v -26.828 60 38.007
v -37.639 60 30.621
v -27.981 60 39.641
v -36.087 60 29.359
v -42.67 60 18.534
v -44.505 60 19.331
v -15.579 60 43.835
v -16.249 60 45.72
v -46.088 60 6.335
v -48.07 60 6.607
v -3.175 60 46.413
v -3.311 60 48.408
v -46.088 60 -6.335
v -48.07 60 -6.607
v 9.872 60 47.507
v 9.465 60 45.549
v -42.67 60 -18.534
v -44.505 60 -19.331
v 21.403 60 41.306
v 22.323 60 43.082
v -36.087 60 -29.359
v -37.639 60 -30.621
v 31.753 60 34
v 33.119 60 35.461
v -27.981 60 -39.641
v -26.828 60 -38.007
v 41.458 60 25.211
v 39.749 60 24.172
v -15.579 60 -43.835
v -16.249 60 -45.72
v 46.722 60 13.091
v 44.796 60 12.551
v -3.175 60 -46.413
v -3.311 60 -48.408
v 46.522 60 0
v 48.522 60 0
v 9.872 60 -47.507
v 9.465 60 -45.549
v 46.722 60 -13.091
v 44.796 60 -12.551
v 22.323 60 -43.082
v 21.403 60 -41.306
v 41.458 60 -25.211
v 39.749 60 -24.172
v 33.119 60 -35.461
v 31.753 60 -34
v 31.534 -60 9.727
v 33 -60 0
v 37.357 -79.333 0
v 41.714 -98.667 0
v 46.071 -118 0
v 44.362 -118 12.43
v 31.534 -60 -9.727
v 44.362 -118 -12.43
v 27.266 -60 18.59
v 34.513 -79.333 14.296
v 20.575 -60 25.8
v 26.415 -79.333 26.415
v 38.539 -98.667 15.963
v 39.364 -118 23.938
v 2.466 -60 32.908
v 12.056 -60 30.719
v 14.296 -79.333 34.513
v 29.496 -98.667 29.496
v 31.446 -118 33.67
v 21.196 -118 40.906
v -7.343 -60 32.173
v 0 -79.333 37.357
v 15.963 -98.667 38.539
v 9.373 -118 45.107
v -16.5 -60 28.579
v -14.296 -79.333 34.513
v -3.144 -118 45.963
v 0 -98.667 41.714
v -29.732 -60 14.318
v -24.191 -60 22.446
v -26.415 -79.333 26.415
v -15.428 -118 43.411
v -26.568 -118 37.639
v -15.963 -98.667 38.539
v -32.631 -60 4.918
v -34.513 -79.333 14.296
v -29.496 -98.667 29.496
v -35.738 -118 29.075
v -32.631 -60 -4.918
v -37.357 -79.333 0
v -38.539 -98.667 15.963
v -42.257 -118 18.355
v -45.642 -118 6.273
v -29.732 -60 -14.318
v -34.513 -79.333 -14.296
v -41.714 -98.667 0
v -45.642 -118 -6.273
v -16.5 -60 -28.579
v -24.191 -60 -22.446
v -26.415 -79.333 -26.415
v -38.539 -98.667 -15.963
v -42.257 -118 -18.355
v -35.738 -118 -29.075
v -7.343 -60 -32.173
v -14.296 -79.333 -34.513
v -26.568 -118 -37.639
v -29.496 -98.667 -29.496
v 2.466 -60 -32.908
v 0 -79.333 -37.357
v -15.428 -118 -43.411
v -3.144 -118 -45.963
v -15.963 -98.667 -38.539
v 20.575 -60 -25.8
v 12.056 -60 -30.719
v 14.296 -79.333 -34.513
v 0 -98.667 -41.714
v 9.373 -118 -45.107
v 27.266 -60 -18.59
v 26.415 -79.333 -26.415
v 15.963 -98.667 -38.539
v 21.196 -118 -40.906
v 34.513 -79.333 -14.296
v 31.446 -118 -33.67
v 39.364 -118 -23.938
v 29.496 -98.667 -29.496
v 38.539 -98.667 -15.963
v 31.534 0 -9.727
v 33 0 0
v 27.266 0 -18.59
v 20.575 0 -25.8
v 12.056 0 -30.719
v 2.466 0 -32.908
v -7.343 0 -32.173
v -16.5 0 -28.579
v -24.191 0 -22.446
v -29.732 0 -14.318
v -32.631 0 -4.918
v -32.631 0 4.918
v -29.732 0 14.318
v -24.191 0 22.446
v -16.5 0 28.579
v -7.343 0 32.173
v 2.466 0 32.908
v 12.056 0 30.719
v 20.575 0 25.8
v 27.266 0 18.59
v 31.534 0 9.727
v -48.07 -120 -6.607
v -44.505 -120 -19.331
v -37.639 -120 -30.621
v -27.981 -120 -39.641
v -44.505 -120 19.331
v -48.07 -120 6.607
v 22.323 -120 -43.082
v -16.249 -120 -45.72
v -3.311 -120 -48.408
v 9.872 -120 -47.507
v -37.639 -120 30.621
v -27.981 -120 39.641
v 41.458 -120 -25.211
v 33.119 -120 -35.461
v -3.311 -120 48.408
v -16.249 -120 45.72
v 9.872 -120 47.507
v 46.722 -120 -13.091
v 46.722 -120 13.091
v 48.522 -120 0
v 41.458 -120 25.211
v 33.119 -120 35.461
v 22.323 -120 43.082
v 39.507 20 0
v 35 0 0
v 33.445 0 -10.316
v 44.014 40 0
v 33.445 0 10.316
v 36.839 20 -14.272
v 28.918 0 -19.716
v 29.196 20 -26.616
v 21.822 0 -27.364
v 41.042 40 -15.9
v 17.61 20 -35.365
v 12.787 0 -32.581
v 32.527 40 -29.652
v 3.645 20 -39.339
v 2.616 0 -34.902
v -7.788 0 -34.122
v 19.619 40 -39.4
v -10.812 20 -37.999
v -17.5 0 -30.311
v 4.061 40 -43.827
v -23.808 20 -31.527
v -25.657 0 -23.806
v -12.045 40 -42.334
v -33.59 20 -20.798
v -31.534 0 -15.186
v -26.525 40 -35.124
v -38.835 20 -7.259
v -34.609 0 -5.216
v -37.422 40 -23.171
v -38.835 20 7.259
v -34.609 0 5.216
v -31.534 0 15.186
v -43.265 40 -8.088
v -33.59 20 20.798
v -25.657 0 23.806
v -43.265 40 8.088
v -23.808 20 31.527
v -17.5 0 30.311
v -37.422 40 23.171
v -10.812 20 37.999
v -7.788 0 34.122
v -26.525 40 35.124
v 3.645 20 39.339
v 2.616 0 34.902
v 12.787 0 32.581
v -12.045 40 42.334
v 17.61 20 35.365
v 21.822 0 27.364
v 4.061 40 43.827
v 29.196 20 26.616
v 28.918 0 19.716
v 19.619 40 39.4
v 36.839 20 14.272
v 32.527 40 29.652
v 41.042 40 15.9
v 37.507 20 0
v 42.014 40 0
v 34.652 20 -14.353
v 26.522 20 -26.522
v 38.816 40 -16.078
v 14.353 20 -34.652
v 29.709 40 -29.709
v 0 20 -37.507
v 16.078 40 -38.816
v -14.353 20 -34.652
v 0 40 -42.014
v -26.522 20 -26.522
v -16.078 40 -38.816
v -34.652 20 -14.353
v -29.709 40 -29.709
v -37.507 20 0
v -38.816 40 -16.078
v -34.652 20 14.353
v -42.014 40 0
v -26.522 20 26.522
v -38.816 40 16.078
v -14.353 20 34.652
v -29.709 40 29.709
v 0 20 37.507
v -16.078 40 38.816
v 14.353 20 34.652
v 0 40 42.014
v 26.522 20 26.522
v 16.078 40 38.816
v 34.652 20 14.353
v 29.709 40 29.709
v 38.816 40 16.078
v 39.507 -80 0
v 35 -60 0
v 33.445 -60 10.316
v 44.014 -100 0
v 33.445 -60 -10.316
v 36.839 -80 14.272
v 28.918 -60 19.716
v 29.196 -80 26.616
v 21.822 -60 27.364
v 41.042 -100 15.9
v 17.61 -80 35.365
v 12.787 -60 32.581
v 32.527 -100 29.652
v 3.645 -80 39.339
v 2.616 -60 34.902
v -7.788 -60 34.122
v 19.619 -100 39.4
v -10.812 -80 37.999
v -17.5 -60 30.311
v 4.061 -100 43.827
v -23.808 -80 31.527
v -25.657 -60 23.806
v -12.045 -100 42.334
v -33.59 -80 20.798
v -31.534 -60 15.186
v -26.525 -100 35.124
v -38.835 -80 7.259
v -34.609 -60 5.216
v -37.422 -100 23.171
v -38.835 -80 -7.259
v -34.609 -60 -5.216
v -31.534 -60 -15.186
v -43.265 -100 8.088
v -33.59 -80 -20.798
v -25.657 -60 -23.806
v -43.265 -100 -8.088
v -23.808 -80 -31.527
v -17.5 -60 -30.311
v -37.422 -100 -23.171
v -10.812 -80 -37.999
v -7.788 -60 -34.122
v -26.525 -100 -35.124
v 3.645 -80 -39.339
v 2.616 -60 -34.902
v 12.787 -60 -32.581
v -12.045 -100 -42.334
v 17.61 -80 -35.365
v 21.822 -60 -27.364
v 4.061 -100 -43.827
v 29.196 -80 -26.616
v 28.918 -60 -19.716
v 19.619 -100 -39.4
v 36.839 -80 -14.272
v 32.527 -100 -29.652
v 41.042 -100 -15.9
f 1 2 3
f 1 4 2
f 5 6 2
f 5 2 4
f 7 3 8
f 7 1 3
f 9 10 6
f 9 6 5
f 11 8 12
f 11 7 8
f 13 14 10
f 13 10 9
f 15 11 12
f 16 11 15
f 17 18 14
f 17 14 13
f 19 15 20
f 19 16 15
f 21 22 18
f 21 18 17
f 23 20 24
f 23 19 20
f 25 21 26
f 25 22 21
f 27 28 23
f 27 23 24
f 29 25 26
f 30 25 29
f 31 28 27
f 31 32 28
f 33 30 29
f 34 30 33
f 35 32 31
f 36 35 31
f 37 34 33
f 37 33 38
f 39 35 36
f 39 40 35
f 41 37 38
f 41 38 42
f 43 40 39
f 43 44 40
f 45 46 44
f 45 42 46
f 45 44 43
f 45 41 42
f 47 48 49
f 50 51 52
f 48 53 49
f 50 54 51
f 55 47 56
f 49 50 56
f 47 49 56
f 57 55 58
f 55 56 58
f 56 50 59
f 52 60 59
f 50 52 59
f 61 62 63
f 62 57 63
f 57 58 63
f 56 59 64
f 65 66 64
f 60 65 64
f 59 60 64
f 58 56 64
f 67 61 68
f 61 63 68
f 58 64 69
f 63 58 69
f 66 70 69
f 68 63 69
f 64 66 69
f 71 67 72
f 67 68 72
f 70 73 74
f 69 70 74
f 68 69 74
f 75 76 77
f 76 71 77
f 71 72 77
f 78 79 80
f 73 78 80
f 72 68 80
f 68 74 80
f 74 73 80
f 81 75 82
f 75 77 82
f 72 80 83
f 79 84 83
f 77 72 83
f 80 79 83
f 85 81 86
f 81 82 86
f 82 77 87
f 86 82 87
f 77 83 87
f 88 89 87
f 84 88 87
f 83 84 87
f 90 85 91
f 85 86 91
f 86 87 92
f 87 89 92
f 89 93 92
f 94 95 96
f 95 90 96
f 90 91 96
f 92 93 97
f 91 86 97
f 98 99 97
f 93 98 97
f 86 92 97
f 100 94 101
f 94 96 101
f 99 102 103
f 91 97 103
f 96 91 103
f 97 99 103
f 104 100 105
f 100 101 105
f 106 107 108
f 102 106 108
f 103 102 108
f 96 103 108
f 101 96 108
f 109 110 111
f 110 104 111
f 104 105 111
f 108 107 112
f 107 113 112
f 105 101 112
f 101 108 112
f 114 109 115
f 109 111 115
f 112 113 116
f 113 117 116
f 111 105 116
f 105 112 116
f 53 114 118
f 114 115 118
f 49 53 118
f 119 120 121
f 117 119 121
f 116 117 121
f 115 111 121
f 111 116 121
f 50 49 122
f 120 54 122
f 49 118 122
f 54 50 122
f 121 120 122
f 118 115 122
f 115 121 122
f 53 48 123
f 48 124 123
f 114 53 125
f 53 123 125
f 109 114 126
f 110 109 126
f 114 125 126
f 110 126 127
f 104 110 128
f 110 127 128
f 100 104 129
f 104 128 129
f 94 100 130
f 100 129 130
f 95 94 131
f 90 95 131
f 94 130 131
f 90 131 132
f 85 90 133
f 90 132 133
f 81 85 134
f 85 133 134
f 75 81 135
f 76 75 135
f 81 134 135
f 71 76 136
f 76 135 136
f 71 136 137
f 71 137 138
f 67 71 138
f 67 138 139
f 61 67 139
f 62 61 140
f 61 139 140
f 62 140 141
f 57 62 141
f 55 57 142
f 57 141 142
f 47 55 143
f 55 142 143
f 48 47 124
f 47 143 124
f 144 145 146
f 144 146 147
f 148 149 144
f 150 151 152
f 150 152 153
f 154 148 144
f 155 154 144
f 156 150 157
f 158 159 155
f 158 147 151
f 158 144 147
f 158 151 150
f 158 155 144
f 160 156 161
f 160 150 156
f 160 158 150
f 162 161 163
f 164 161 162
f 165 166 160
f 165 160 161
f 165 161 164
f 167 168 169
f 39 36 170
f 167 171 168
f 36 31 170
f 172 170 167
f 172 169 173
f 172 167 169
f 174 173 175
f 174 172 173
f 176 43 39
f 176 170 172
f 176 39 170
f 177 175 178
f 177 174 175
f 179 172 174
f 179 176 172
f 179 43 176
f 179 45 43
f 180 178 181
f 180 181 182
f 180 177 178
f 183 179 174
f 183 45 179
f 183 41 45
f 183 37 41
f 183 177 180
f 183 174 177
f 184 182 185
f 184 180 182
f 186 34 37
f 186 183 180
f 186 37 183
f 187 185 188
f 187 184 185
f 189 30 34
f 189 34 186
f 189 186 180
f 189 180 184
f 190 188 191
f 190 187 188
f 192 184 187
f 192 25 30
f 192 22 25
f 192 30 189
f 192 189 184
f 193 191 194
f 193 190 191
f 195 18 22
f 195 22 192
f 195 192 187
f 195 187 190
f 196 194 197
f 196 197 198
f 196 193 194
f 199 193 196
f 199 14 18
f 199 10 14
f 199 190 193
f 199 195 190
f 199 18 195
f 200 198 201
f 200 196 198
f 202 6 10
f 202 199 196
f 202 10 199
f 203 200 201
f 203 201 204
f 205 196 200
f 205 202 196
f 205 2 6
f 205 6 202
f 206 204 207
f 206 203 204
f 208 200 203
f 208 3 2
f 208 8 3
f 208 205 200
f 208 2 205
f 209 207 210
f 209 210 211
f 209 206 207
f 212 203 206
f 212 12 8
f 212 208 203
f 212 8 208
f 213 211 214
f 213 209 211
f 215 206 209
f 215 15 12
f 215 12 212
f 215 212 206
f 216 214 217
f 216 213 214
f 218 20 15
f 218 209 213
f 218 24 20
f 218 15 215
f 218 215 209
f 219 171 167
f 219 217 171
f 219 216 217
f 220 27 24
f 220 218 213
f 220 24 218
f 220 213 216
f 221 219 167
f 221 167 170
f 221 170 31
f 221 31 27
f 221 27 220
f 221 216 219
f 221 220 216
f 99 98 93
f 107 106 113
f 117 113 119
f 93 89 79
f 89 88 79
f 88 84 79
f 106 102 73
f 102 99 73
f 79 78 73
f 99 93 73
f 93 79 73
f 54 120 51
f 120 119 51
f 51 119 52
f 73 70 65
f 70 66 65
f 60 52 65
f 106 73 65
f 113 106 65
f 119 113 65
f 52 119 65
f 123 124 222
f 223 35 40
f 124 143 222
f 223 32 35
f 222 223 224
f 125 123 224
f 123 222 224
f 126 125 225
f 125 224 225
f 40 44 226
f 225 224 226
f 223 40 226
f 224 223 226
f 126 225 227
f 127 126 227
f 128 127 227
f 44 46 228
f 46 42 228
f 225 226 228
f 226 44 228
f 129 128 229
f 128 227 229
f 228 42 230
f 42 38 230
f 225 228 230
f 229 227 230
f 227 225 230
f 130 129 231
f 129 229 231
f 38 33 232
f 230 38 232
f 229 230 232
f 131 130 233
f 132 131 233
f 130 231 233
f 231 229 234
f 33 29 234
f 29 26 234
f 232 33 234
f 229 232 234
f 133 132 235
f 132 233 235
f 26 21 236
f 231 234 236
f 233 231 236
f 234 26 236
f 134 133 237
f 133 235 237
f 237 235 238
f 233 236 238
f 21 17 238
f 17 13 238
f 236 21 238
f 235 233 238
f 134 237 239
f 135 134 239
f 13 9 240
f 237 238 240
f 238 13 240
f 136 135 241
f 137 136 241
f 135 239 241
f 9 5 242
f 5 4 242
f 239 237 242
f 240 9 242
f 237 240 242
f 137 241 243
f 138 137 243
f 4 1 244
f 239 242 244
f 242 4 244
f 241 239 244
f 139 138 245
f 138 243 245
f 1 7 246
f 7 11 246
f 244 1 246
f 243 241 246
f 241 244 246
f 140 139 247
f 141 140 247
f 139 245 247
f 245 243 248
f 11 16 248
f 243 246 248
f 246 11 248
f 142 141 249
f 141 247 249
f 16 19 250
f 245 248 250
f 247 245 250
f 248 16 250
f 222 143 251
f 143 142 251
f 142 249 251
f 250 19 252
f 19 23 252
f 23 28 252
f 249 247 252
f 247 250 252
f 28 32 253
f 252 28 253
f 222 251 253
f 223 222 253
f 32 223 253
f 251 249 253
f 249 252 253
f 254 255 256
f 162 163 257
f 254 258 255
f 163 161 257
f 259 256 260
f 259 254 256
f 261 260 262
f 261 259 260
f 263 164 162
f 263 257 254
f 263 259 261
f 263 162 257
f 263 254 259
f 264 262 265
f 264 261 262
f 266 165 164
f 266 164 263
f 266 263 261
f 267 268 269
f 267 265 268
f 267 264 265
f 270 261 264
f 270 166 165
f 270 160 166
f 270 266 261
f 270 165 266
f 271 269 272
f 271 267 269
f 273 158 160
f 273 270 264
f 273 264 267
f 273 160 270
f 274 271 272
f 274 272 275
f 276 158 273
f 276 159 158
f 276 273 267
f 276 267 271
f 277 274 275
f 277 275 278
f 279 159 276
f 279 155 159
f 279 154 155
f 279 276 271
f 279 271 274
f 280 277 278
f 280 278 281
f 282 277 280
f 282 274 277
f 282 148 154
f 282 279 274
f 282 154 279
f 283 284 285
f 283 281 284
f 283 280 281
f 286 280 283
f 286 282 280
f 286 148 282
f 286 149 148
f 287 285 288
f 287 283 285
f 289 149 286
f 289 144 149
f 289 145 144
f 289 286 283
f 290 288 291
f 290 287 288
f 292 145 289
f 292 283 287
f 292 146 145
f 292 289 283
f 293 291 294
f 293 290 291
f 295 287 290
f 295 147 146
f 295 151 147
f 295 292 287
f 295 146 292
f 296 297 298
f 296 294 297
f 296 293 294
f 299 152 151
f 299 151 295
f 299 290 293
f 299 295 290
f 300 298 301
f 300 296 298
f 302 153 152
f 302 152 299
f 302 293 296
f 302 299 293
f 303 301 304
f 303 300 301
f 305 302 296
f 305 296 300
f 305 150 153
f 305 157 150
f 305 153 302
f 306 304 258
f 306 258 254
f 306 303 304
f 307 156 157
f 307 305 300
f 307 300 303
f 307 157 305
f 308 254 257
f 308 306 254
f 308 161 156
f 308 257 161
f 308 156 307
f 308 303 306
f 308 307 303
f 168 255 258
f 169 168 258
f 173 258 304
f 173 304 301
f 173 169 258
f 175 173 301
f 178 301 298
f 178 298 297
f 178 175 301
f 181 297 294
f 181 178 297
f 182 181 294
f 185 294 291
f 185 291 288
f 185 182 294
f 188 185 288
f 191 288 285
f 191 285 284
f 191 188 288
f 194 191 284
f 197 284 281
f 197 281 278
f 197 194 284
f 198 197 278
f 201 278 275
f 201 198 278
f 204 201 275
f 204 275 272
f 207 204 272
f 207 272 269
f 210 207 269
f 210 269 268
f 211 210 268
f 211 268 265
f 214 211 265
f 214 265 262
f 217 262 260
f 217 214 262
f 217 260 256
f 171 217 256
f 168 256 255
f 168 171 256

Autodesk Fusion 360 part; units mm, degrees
sketch "草图1" plane through (0, 0, 0) normal (0, 1, 0) x (1, 0, 0)
  circle A0 centre (0, 0) radius 46.5
  circle A1 centre (0, 0) radius 33
  circle A2 centre (0, 0) radius 48.5
  circle A3 centre (0, 0) radius 35
  dimension "d1" = 93
  dimension "d2" = 66
  dimension "d3" = 97
  dimension "d4" = 70
extrude "拉伸3" add sketch "草图1" along normal blind 60 draft 12.7 contours A3
extrude "拉伸4" cut sketch "草图1" along normal blind 60 draft 12.7 contours A1
extrude "拉伸5" add sketch "草图1" against normal blind 60 contours A3
sketch "草图2" plane through (0, -60, 0) normal (0, -1, 0) x (1, 0, 0)
  circle A0 centre (0, 0) radius 33
  circle A1 centre (0, 0) radius 35
extrude "拉伸6" add sketch "草图2" along normal blind 60 draft 12.7
extrude "拉伸7" cut sketch "草图2" along normal blind 60 draft 12.7 contours A0
sketch "草图3" plane through (0, -120, 0) normal (0, -1, 0) x (1, 0, 0)
  circle A0 centre (0, 0) radius 46.5216
  circle A1 centre (0, 0) radius 48.5216
extrude "拉伸8" add sketch "草图3" against normal blind 2 draft 12.7 contours A0
